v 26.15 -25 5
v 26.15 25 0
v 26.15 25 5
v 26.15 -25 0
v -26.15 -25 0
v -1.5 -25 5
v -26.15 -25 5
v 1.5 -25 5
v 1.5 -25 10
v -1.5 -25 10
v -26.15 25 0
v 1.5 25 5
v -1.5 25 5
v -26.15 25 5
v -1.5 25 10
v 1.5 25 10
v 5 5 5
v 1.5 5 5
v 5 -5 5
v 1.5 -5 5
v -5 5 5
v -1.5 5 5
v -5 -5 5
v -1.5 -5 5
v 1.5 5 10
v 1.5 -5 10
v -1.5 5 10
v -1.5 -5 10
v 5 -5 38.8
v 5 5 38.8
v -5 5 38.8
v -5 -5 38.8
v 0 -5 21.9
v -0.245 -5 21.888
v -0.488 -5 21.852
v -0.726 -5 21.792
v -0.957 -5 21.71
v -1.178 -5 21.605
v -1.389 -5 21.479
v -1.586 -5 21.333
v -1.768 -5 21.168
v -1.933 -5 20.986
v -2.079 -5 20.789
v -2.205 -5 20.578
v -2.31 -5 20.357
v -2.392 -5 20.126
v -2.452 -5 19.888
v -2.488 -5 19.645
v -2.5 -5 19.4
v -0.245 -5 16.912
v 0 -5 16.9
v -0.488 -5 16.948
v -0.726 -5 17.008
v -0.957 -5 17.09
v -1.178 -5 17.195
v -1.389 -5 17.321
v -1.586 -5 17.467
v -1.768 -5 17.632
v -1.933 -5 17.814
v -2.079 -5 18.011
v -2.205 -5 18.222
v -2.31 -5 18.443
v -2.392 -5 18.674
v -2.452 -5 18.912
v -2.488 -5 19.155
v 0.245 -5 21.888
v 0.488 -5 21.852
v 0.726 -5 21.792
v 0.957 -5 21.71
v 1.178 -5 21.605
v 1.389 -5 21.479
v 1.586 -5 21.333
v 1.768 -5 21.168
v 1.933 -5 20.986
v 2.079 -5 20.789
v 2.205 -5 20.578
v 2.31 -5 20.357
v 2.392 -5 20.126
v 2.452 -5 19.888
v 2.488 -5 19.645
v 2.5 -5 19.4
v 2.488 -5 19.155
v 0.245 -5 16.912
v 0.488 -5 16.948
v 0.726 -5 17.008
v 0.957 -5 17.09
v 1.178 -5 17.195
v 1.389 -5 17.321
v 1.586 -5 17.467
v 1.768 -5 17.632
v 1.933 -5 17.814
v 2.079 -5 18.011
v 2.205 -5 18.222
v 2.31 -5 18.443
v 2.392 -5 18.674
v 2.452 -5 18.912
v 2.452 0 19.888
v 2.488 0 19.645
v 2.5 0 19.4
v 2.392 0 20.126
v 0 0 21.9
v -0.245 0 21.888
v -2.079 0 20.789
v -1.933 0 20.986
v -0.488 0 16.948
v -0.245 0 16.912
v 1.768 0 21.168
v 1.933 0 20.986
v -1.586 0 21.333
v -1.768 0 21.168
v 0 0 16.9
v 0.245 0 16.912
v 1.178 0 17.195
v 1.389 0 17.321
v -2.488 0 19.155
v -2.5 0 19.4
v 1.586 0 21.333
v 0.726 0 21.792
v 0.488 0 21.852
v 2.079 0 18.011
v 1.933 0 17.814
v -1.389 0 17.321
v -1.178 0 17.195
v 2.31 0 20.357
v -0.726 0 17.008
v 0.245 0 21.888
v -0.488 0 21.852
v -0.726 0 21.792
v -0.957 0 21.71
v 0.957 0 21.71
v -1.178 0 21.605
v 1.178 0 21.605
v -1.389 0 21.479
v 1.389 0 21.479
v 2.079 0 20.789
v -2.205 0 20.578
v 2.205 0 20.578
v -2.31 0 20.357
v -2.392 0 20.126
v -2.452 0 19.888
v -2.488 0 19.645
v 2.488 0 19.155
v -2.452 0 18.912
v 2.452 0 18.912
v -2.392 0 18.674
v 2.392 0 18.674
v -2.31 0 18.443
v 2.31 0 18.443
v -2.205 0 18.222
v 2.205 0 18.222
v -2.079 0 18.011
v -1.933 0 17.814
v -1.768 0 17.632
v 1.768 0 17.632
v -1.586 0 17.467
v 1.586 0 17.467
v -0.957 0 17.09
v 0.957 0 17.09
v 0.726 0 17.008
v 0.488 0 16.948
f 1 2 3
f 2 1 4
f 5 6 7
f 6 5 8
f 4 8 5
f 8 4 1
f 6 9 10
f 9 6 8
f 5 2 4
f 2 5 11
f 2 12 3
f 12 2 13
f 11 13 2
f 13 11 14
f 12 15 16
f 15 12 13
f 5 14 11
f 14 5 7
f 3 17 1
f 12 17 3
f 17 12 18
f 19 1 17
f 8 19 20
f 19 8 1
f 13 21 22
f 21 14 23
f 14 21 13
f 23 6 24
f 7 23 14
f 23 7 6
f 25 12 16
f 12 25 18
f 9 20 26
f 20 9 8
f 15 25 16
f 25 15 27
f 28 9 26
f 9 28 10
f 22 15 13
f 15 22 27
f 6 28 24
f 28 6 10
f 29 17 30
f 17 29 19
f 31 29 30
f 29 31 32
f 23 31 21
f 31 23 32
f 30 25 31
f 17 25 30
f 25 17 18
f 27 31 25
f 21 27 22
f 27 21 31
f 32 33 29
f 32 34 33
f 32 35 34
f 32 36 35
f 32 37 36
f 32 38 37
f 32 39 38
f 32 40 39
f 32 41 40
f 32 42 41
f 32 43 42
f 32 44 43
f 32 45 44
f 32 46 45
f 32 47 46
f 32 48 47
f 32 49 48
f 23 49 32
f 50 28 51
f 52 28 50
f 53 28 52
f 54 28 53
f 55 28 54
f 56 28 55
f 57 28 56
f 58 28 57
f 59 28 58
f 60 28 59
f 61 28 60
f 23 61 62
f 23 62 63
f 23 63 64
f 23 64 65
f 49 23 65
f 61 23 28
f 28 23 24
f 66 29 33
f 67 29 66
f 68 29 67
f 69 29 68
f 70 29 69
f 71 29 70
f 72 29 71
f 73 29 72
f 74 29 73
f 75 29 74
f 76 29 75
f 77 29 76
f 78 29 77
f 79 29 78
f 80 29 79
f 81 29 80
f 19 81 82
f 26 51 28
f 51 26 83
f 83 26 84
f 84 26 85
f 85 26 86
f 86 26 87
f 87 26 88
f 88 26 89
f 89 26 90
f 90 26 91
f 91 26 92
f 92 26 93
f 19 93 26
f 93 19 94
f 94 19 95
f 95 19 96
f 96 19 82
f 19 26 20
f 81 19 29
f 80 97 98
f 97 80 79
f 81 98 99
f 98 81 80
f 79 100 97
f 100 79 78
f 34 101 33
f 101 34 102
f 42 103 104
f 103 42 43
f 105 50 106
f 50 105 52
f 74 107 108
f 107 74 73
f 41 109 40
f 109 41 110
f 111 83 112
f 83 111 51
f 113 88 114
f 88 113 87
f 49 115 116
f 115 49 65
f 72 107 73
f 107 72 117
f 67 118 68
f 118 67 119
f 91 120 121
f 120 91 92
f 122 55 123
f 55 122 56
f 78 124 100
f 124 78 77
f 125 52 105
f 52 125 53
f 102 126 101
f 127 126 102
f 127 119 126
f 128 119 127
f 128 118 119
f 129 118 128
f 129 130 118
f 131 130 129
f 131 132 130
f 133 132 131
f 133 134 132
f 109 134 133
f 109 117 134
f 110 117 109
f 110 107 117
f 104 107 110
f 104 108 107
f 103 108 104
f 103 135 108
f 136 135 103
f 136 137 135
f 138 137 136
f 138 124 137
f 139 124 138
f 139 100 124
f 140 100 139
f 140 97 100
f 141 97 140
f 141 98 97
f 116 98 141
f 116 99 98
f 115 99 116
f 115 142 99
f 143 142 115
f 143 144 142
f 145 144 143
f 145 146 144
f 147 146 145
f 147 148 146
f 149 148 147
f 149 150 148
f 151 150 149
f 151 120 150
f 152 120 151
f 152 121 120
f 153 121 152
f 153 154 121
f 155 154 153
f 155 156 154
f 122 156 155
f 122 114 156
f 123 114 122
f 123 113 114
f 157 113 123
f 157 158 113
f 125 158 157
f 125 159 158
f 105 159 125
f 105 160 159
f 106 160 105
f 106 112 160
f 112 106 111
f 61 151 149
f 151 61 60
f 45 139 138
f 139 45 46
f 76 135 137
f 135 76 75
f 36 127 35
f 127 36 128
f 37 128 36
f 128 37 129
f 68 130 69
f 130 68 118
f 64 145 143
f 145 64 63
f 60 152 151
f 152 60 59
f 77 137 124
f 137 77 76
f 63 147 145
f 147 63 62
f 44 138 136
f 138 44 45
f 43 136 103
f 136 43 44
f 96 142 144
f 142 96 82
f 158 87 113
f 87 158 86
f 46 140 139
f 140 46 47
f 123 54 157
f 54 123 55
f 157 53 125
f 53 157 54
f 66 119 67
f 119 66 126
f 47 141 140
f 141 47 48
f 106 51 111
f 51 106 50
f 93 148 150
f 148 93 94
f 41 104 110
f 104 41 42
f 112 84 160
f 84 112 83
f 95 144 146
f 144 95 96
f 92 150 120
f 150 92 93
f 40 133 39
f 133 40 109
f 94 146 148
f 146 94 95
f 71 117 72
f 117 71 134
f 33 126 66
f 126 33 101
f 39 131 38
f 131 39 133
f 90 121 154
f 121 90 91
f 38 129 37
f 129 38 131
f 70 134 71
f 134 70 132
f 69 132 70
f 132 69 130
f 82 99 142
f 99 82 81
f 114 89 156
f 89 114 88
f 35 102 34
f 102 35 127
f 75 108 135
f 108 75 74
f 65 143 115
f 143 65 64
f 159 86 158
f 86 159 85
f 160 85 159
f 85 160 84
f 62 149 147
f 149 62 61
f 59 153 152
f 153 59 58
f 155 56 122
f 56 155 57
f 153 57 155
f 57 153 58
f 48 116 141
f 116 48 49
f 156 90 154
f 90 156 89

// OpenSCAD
module bracket() {
    difference() {
        union() {
            // V-shaped flared plate
            translate([-26.15, -25, 0])
            hull() {
                translate([0, 0, 0])
                cube([5, 50, 5]);
                translate([47.3, 0, 0])
                cube([5, 50, 5]);
            }
            
            // Central ridge/crease
            translate([-1.5, -25, 5])
            cube([3, 50, 5]);
            
            // Rectangular stem
            translate([-5, -5, 0])
            cube([10, 10, 38.8]);
        }
        
        // Circular through-hole
        translate([0, 0, 19.4])
        rotate([90, 0, 0])
        cylinder(h=10, r=2.5, $fn=64);
    }
}

bracket();
